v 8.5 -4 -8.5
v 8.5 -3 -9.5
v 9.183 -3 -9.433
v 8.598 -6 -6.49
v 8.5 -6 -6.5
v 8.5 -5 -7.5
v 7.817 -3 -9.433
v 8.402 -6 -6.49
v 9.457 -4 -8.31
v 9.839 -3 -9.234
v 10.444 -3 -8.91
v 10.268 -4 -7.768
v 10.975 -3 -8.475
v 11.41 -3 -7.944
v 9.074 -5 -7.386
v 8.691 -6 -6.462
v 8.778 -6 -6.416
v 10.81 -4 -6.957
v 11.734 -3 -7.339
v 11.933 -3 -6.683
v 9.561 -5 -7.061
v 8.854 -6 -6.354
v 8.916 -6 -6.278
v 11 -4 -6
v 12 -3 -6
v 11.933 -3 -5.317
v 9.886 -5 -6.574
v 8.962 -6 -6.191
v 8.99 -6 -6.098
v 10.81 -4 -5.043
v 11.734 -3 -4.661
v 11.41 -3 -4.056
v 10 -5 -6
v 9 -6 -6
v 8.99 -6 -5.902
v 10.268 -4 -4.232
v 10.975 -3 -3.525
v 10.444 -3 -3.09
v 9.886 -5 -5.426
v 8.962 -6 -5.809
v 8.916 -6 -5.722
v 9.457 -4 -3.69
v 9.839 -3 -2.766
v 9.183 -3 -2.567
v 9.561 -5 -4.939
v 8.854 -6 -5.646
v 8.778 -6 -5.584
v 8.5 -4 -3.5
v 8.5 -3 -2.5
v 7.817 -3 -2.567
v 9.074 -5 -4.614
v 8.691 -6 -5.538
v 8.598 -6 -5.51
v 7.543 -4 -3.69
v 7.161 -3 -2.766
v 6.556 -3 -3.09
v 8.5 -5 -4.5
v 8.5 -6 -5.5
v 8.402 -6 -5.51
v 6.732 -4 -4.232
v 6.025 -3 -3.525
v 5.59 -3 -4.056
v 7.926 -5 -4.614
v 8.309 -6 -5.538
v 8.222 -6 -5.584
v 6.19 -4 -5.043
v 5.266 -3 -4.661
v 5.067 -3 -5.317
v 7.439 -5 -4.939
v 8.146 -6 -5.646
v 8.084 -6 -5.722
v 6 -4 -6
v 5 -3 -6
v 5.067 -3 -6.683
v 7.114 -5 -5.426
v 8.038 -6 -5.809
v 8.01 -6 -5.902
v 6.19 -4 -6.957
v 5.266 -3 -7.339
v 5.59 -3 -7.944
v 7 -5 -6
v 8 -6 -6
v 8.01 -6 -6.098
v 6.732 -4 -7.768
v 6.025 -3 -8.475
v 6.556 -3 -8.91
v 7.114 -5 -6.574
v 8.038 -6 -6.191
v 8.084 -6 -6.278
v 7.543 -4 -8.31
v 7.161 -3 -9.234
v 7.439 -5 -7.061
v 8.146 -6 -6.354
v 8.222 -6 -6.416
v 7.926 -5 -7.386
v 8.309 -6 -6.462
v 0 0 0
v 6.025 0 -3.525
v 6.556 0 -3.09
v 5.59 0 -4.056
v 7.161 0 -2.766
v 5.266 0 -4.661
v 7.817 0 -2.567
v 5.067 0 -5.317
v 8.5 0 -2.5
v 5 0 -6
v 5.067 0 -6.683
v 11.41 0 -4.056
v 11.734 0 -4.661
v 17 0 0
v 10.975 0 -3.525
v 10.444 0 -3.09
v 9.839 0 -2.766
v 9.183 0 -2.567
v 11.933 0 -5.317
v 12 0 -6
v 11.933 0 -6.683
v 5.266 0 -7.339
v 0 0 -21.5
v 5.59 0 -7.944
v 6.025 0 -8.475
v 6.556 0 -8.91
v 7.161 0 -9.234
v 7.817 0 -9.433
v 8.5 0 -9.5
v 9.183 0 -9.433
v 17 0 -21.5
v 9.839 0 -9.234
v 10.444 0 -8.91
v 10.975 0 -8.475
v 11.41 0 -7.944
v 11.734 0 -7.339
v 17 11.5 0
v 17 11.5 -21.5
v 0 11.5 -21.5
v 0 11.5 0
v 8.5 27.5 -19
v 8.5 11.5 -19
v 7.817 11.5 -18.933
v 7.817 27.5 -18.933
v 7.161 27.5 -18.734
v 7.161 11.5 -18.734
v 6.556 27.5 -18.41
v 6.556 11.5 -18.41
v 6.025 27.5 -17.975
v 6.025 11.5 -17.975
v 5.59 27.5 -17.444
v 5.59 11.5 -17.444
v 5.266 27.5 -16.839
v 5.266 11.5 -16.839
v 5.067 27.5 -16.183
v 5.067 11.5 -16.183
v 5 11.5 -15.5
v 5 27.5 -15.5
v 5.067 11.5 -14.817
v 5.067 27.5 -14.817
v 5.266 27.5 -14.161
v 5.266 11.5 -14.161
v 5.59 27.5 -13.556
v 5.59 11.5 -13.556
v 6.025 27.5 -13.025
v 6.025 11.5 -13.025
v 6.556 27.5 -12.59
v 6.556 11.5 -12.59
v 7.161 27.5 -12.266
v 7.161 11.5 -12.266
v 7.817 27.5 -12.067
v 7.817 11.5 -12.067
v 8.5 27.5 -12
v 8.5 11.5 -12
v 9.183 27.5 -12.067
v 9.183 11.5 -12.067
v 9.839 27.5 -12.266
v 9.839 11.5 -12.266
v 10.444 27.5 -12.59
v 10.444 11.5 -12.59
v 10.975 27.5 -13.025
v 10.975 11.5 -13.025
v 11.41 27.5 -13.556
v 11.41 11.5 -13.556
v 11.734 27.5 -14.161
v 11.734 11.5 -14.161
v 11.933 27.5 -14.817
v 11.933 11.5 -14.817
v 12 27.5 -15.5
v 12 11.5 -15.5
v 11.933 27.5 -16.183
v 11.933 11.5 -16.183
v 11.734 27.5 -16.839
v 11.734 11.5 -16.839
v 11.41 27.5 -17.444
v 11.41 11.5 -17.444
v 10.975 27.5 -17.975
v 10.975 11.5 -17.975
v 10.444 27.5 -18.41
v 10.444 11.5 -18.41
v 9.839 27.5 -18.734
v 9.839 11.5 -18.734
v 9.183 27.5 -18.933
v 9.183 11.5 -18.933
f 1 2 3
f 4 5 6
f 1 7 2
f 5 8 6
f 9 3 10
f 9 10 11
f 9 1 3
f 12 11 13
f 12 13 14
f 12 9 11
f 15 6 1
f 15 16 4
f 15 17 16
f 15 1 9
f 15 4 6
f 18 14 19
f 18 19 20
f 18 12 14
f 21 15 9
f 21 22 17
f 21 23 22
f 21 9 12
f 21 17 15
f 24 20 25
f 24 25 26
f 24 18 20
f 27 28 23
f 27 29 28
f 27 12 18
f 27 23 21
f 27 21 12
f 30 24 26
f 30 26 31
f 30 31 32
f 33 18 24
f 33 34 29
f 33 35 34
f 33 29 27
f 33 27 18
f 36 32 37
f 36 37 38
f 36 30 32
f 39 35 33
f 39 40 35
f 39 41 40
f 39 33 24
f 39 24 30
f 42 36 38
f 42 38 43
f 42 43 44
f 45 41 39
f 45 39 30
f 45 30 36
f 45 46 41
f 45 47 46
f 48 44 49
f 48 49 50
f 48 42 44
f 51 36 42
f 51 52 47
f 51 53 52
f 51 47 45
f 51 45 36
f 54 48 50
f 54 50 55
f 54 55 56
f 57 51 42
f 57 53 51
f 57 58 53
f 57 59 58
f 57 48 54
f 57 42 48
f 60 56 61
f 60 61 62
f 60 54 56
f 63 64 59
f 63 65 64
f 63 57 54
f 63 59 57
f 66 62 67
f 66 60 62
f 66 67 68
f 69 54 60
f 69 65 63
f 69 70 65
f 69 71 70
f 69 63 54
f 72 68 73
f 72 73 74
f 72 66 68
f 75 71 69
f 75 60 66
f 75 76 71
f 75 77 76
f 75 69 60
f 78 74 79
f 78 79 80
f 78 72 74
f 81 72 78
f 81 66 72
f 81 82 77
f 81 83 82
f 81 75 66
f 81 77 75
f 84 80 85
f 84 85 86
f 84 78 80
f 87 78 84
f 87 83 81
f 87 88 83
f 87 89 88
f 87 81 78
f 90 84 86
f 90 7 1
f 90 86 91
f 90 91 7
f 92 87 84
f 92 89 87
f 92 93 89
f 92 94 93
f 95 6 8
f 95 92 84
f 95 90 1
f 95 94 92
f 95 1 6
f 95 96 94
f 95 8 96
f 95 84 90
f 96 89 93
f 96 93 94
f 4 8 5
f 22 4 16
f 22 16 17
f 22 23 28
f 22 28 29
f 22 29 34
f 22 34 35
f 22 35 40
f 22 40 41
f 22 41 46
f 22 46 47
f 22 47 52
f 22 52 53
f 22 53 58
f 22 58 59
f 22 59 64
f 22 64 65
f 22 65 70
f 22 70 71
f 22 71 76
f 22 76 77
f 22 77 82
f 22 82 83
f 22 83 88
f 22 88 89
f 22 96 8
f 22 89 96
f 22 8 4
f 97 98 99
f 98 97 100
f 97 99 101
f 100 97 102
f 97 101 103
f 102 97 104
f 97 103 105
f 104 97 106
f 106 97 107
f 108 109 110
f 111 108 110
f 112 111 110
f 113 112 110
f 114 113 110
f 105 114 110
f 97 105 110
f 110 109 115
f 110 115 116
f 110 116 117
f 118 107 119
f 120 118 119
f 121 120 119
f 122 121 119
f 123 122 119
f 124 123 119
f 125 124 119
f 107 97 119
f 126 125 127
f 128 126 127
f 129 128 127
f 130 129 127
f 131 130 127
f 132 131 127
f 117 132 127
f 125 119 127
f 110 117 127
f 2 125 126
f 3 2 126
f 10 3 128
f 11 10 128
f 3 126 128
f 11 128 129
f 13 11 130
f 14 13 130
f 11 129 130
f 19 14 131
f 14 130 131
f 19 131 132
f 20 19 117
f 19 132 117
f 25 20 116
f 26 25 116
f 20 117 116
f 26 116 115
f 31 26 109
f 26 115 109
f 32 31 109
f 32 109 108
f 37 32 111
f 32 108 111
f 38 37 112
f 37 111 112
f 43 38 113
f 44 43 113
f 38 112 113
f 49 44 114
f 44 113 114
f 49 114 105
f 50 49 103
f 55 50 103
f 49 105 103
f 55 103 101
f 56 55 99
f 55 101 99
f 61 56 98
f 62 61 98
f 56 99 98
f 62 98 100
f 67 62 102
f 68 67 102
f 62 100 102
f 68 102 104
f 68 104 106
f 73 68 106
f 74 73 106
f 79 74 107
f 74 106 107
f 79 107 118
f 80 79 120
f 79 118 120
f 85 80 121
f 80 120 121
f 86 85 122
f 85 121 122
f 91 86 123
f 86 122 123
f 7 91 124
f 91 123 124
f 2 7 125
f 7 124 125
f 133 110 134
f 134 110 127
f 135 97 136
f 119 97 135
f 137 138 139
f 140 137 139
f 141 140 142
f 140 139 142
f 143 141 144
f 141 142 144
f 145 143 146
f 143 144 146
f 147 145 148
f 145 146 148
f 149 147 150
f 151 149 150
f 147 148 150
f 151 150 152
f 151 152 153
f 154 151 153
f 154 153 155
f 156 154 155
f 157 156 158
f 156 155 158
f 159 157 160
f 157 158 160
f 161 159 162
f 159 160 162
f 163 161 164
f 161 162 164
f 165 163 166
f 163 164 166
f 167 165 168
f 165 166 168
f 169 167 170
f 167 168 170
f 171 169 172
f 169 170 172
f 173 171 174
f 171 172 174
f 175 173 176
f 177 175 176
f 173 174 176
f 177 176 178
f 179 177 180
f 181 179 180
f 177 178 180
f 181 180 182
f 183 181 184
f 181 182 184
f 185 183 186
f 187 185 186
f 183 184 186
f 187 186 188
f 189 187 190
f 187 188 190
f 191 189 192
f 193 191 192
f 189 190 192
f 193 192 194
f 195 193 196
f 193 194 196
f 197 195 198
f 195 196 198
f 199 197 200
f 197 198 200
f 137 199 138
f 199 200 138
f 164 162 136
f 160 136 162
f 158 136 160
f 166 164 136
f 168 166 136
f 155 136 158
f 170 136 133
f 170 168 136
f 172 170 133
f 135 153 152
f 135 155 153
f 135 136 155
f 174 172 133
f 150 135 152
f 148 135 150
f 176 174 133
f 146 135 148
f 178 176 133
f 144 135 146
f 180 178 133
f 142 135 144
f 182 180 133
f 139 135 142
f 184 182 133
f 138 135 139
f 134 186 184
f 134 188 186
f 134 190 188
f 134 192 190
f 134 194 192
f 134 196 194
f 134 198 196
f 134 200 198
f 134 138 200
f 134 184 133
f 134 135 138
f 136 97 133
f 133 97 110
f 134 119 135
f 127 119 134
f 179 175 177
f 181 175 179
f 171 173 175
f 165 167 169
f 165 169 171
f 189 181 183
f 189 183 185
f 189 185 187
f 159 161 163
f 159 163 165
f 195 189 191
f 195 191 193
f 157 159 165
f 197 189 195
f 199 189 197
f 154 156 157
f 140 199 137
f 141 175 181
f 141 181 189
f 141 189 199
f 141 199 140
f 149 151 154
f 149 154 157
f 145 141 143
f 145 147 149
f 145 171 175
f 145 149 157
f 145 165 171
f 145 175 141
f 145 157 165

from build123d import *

# Parameters (mm, degrees)
SKETCH1_W           = 17
SKETCH1_H           = 21.5
BOSS_EXTRUDE1_DEPTH = 11.5
SKETCH2_R           = 3.5
BOSS_EXTRUDE2_DEPTH = 16
SKETCH3_R           = 3.5
BOSS_EXTRUDE3_DEPTH = 6
CHAMFER1_SIZE       = 3


with BuildPart() as part:
    # Sketch1 → Boss-Extrude1 (new body)
    with BuildSketch(Plane(origin=(0, 0, 0), x_dir=(1, 0, 0), z_dir=(0, 1, 0))):
        with Locations((8.5, 10.75)):
            Rectangle(SKETCH1_W, SKETCH1_H)
    extrude(amount=BOSS_EXTRUDE1_DEPTH)

    # Sketch2 → Boss-Extrude2 (add)
    with BuildSketch(Plane(origin=(0, 11.5, 0), x_dir=(1, 0, 0), z_dir=(0, 1, 0))):
        with Locations(Location((8.5, 15.5, 0), (0, 0, 90))):
            Circle(SKETCH2_R)
    extrude(amount=BOSS_EXTRUDE2_DEPTH)

    # Sketch3 → Boss-Extrude3 (add)
    with BuildSketch(Plane.XZ):
        with Locations(Location((8.5, -6, 0), (0, 0, 270))):
            Circle(SKETCH3_R)
    extrude(amount=BOSS_EXTRUDE3_DEPTH)

    # Chamfer1
    chamfer1_edges = [part.edges().sort_by_distance(p)[0] for p in [
        (8.5, -6, -2.5),
    ]]
    chamfer(chamfer1_edges, length=CHAMFER1_SIZE)


solid = part.part
